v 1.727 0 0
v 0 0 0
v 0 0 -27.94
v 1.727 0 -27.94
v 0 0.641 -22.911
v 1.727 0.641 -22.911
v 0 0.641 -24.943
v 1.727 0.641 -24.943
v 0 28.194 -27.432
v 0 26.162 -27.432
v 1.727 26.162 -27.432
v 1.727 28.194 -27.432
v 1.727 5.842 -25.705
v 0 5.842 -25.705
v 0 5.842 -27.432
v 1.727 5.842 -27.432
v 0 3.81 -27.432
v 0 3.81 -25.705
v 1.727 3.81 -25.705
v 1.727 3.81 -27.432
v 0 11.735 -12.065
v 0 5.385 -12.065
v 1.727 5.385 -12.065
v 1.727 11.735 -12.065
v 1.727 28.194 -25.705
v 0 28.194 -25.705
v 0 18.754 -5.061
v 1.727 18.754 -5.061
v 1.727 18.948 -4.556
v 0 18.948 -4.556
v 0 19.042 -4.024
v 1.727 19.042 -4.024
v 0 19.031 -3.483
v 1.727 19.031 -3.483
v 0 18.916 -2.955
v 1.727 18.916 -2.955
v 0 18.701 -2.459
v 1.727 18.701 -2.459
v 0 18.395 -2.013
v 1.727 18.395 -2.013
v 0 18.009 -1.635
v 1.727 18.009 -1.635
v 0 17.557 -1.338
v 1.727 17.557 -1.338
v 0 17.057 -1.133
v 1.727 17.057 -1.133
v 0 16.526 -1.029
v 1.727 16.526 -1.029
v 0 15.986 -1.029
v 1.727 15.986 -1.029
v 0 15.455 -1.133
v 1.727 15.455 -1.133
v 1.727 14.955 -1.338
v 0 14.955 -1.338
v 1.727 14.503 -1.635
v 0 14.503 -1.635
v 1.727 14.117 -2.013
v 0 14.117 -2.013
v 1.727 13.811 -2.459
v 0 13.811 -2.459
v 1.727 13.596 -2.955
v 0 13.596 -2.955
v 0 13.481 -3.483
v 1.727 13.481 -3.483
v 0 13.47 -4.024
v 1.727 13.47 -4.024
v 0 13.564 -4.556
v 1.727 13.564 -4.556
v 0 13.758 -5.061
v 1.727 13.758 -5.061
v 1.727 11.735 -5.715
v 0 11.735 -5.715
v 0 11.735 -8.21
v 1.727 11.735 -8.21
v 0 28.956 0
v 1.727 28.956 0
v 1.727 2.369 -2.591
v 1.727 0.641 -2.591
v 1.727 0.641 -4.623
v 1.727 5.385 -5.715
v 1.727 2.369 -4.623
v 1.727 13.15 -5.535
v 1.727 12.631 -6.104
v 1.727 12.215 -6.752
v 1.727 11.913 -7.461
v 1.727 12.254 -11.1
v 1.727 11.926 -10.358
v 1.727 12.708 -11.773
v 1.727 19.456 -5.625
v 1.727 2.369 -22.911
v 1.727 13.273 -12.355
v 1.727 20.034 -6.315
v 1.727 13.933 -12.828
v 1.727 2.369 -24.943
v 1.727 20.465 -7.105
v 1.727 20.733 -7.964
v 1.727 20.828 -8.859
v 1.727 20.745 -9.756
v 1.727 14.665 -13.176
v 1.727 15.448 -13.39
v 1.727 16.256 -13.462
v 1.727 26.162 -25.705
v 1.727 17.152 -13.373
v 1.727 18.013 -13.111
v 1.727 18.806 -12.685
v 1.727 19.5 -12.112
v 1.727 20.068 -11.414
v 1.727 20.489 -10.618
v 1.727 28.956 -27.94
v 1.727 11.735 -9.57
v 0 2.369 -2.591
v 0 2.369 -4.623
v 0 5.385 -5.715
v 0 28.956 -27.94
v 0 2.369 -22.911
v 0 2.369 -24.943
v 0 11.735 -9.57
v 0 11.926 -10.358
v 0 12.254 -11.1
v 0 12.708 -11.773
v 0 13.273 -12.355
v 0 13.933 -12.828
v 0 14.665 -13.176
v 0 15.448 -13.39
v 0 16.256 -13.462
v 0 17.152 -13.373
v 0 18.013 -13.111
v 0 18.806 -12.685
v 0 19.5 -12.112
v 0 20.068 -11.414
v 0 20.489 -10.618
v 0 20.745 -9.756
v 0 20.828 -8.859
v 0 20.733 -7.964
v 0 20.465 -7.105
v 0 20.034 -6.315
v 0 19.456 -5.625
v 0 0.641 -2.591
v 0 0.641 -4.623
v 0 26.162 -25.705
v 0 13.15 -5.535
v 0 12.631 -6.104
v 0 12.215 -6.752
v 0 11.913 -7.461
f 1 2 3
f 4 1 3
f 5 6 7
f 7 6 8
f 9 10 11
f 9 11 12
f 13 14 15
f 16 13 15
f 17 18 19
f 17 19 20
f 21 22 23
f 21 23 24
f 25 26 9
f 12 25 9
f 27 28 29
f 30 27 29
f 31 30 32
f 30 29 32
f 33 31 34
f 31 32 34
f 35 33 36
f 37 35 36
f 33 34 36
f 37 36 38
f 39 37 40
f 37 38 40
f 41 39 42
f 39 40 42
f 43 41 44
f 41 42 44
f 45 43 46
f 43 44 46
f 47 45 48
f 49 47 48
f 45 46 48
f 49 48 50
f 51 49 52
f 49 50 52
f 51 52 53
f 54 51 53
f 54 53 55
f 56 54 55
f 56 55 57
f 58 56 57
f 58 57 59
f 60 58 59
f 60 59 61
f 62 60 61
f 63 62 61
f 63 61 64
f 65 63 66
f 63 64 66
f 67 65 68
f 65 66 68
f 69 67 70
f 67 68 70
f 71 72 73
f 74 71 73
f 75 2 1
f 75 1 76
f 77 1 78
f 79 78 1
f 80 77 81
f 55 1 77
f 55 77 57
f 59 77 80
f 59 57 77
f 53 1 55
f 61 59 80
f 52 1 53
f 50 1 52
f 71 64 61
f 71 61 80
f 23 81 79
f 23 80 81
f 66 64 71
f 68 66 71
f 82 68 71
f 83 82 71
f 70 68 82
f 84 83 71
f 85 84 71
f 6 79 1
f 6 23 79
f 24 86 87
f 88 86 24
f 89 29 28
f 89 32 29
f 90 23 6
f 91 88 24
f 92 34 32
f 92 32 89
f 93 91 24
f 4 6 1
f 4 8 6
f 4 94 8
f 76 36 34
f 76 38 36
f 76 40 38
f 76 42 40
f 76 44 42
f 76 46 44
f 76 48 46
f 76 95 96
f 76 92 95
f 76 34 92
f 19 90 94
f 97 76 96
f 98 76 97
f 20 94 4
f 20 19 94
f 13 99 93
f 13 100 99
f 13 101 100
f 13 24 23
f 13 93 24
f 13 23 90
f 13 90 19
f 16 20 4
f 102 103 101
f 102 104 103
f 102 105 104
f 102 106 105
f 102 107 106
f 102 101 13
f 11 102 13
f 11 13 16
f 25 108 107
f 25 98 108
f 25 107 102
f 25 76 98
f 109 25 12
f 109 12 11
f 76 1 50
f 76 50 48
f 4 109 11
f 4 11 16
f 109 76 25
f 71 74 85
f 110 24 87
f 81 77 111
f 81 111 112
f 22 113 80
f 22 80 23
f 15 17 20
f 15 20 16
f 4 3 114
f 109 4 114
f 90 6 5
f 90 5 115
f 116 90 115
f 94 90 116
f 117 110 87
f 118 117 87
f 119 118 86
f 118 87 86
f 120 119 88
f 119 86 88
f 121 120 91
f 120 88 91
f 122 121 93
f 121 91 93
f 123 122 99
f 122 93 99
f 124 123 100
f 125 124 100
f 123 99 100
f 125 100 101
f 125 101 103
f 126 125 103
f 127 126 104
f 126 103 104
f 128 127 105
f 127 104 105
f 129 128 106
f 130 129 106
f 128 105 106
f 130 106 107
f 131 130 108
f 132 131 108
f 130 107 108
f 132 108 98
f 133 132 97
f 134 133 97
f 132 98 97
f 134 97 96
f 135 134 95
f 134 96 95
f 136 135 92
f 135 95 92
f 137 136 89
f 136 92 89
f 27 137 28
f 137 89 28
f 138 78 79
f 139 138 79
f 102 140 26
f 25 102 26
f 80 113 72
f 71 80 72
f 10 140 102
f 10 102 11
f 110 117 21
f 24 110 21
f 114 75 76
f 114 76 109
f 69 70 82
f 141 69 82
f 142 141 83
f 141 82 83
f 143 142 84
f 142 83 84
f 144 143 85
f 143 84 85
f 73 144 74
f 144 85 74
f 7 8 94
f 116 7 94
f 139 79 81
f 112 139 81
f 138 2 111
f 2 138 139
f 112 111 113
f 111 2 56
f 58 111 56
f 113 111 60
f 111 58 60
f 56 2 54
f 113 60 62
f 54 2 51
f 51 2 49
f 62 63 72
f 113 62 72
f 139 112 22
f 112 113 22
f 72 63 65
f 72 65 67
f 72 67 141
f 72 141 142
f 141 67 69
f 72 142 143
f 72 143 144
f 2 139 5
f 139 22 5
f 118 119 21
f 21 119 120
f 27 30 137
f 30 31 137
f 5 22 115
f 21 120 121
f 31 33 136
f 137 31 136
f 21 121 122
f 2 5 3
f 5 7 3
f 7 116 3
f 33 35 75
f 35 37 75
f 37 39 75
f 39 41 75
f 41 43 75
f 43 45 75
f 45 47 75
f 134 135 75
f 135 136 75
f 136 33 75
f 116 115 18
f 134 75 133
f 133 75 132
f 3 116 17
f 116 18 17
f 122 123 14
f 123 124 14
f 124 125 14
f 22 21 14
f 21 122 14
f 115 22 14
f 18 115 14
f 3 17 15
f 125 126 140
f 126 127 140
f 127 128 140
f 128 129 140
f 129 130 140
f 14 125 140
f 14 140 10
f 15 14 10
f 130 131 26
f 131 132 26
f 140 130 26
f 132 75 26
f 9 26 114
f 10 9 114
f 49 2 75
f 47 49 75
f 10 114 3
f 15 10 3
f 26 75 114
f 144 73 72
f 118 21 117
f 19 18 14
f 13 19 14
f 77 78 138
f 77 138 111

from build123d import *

# Parameters (mm, degrees)
SKETCH1_W           = 27.94
SKETCH1_H           = 28.956
SKETCH1_W_2         = 6.35
SKETCH1_H_2         = 6.35
SKETCH1_W_3         = 1.7272
SKETCH1_H_3         = 2.032
BOSS_EXTRUDE1_DEPTH = 1.7272
SKETCH3_W           = 2.032
SKETCH3_H           = 1.7272
CUT_EXTRUDE1_DEPTH  = 1.7272
SKETCH4_R           = 4.572
SKETCH4_R_2         = 2.794
CUT_EXTRUDE4_DEPTH  = 1.7272


with BuildPart() as part:
    # Sketch1 → Boss-Extrude1 (new body)
    with BuildSketch(Plane(origin=(0, 0, 0), x_dir=(0, 0, -1), z_dir=(1, 0, 0))):
        with Locations((13.97, 14.478)):
            Rectangle(SKETCH1_W, SKETCH1_H)
        with Locations((8.89, 8.5598)):
            Rectangle(SKETCH1_W_2, SKETCH1_H_2, mode=Mode.SUBTRACT)
        with Locations((26.5684, 4.826)):
            Rectangle(SKETCH1_W_3, SKETCH1_H_3, mode=Mode.SUBTRACT)
        with Locations((26.5684, 27.178)):
            Rectangle(SKETCH1_W_3, SKETCH1_H_3, mode=Mode.SUBTRACT)
    extrude(amount=BOSS_EXTRUDE1_DEPTH)

    # Sketch3 → Cut-Extrude1 (cut)
    with BuildSketch(Plane(origin=(1.7272, 0, 0), x_dir=(0, 0, -1), z_dir=(1, 0, 0))):
        with Locations((3.6068, 1.50495)):
            Rectangle(SKETCH3_W, SKETCH3_H)
        with Locations((23.9268, 1.50495)):
            Rectangle(SKETCH3_W, SKETCH3_H)
    extrude(amount=-CUT_EXTRUDE1_DEPTH, mode=Mode.SUBTRACT)

    # Sketch4 → Cut-Extrude4 (cut)
    with BuildSketch(Plane(origin=(1.7272, 0, 0), x_dir=(0, 0, -1), z_dir=(1, 0, 0))):
        with BuildLine():
            ThreePointArc((9.569657679, 11.7348), (12.354864998, 13.273066118), (13.462, 16.256))
            ThreePointArc((13.462, 16.256), (10.193220511, 20.638328183), (5.06095, 18.754311449))
            ThreePointArc((5.06095, 18.754311449), (6.18714012, 17.724210084), (6.604, 16.256))
            ThreePointArc((6.604, 16.256), (6.18714012, 14.787789916), (5.06095, 13.757688551))
            ThreePointArc((5.06095, 13.757688551), (6.41914372, 12.409176213), (8.210342321, 11.7348))
            Line((8.210342321, 11.7348), (9.569657679, 11.7348))
        make_face()
        with Locations((8.89, 16.256)):
            Circle(SKETCH4_R)
        with Locations((3.81, 16.256)):
            Circle(SKETCH4_R_2)
    extrude(amount=-CUT_EXTRUDE4_DEPTH, mode=Mode.SUBTRACT)


solid = part.part
